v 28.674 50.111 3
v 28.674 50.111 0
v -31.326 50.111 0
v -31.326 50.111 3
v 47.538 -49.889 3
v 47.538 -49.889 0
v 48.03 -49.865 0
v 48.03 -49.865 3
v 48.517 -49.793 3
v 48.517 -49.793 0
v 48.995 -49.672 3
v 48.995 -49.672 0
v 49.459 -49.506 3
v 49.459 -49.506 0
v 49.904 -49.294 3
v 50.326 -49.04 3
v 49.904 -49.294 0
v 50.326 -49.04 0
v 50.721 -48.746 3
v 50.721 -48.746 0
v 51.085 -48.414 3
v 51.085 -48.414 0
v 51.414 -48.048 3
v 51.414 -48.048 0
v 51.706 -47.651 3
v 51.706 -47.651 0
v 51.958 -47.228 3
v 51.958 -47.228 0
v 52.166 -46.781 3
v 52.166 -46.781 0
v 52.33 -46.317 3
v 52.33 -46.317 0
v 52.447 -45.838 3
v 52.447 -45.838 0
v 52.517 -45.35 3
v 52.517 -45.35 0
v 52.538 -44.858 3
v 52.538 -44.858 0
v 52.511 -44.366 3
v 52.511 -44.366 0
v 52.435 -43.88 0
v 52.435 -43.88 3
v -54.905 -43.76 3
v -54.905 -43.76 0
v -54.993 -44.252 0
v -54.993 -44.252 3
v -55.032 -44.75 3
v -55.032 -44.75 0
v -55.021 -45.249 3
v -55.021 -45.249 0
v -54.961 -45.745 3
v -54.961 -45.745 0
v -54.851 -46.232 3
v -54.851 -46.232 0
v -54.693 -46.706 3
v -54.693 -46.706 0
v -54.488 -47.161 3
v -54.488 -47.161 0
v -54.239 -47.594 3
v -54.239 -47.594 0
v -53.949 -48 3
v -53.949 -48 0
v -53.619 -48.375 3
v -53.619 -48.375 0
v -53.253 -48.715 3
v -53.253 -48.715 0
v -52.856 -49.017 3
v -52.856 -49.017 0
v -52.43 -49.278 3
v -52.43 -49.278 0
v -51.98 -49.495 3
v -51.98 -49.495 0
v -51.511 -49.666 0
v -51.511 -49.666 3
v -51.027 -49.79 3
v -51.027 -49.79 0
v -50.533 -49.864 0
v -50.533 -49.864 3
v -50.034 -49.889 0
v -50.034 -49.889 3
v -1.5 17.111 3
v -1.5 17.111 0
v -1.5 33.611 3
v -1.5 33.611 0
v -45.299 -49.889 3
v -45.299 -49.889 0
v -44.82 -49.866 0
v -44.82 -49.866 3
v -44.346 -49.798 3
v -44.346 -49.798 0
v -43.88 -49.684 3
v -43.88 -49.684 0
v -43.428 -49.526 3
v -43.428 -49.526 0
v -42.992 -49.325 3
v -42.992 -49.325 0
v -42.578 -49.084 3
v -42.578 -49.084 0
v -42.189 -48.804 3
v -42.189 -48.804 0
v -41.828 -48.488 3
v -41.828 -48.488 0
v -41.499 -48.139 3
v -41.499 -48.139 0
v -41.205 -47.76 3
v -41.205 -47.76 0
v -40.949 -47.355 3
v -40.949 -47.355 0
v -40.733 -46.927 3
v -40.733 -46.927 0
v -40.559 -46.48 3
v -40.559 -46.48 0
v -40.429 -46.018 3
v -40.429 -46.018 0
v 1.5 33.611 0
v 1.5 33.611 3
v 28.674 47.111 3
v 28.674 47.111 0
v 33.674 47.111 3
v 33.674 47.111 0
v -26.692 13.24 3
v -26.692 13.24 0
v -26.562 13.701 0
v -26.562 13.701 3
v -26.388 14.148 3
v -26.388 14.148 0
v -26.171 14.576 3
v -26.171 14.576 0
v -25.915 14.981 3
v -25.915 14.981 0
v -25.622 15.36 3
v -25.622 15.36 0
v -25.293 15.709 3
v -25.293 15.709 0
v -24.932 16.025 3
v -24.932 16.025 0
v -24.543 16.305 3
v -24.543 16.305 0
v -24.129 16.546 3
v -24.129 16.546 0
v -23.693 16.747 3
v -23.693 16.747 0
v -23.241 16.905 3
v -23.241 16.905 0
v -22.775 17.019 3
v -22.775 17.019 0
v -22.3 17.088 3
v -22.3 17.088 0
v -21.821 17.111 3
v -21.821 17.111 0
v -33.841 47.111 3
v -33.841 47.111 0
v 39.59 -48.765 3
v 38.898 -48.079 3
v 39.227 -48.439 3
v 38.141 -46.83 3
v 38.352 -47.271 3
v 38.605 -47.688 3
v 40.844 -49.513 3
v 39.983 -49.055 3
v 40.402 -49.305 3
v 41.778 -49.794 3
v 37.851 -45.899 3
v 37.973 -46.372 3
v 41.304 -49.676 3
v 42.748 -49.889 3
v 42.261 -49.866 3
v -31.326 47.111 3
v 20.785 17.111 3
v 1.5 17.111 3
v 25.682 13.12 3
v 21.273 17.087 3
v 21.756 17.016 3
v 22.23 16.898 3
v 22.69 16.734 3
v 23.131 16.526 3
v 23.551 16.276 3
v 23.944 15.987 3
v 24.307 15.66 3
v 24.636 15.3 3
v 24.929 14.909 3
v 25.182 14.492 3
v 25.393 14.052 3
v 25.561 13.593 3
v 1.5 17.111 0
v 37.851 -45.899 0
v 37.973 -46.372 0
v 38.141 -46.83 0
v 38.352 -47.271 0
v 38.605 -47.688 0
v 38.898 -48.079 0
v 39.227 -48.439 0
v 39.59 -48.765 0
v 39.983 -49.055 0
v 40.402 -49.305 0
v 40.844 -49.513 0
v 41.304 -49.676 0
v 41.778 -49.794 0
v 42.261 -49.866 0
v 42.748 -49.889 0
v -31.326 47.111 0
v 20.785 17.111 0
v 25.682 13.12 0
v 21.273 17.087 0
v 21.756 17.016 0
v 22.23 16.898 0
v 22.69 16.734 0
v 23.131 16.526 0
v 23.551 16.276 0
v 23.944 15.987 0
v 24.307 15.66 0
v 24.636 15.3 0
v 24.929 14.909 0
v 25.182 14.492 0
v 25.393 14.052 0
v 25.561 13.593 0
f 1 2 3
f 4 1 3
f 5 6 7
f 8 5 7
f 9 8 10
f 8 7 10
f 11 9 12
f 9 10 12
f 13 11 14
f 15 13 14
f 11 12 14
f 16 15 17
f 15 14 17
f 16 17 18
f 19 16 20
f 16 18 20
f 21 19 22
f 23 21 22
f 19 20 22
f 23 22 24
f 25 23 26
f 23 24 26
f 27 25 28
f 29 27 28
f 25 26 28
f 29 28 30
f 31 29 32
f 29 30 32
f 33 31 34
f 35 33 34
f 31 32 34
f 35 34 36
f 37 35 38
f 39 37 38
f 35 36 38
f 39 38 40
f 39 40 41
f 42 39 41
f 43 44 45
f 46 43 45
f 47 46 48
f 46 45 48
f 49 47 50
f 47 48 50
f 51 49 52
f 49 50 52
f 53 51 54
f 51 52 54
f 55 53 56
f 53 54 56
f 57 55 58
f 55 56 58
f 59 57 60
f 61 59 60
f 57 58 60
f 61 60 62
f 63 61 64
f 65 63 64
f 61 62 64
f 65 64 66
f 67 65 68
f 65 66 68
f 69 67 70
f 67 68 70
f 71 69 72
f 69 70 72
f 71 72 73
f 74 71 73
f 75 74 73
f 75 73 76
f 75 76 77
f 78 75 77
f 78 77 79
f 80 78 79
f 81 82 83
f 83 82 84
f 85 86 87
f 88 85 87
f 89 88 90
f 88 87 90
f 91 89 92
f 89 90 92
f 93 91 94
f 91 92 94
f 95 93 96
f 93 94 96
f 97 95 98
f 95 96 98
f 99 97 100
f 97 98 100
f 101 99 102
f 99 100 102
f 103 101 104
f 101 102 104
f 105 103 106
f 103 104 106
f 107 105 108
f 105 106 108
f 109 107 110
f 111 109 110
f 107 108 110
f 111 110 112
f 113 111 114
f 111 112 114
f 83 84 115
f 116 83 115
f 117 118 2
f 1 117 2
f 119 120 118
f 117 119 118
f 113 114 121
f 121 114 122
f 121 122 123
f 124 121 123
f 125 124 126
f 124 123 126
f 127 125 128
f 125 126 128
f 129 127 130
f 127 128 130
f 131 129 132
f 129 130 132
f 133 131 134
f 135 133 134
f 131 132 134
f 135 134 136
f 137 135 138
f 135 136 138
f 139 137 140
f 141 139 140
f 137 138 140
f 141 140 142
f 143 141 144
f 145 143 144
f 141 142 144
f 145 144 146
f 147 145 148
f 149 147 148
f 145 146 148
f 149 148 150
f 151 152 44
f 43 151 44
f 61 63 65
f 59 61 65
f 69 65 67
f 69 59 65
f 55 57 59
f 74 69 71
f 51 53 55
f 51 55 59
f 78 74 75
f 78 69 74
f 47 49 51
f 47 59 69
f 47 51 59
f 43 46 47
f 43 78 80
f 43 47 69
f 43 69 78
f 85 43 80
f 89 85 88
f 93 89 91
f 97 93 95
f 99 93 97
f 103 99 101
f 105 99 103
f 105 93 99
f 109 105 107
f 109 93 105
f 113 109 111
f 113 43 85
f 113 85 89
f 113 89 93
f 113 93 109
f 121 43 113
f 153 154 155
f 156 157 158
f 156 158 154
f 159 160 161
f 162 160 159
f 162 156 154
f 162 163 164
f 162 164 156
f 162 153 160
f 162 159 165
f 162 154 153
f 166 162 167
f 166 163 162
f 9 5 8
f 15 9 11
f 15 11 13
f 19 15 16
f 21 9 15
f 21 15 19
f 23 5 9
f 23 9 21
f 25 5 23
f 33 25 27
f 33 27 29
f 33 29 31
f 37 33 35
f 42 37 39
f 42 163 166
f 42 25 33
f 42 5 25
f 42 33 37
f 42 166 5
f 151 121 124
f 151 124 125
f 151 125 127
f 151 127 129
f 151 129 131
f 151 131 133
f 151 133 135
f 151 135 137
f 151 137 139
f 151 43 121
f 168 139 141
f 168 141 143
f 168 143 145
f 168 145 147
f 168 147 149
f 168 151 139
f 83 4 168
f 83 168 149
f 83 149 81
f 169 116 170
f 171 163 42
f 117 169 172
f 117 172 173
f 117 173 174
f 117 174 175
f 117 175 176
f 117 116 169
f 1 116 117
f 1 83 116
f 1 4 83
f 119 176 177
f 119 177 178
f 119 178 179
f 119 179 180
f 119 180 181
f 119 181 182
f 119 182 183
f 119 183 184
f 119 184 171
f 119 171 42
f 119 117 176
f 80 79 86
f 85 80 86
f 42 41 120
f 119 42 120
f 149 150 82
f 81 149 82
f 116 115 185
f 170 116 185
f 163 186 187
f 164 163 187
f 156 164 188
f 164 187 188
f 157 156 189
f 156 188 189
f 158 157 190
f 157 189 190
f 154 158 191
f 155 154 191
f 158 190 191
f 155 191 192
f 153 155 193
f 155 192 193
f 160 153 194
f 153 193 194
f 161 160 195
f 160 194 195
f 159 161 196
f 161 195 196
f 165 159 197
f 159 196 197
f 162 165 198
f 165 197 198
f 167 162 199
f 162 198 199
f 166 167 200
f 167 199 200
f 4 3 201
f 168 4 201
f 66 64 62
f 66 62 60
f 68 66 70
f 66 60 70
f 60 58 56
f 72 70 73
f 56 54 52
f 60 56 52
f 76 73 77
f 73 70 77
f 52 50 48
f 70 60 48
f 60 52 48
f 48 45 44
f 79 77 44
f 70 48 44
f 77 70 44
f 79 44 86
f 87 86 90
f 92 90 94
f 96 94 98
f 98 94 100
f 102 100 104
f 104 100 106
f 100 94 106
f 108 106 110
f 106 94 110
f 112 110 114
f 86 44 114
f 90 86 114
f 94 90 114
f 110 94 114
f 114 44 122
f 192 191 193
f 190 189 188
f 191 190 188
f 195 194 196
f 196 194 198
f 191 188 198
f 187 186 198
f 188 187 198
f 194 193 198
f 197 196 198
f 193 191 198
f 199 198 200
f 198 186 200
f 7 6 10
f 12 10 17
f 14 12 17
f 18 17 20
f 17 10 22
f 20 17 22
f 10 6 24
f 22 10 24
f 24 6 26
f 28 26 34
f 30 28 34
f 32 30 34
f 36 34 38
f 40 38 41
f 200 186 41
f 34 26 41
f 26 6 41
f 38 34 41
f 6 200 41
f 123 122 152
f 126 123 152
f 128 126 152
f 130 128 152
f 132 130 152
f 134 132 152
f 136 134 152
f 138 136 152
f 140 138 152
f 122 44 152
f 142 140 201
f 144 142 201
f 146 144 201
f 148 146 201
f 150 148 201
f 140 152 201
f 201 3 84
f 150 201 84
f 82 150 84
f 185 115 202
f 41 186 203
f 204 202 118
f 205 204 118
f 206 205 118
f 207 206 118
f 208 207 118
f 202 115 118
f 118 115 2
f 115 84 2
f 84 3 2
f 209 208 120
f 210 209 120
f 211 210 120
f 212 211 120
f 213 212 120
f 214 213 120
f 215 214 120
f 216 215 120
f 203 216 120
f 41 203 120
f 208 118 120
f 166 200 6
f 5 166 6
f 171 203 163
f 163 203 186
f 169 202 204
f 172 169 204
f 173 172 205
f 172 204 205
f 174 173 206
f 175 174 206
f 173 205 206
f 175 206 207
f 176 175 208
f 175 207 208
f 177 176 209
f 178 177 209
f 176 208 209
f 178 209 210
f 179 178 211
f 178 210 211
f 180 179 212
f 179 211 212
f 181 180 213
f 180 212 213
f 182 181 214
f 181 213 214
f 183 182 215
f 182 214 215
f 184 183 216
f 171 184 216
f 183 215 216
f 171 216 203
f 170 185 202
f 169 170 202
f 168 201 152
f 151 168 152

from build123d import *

# Parameters (mm, degrees)
F1_DEPTH = 3


with BuildPart() as f1:
    # F0 (on Top) → F1 (new body)
    with BuildSketch(Plane.XY):
        with BuildLine():
            Line((28.674154, 50.110632), (-31.325846, 50.110632))
            Line((-31.325846, 50.110632), (-31.325846, 47.110632))
            Line((-31.325846, 47.110632), (-33.840805, 47.110632))
            Line((-33.840805, 47.110632), (-54.905096, -43.760283))
            ThreePointArc((-54.905096, -43.760283), (-53.948671, -48.000202), (-50.034247, -49.889368))
            Line((-50.034247, -49.889368), (-45.299399, -49.889368))
            ThreePointArc((-45.299399, -49.889368), (-42.188565, -48.803792), (-40.42855, -46.018453))
            Line((-40.42855, -46.018453), (-26.692237, 13.239717))
            ThreePointArc((-26.692237, 13.239717), (-24.932222, 16.025056), (-21.821388, 17.110632))
            Line((-21.821388, 17.110632), (-1.5, 17.110632))
            Line((-1.5, 17.110632), (-1.5, 33.610632))
            Line((-1.5, 33.610632), (1.5, 33.610632))
            Line((1.5, 33.610632), (1.5, 17.110632))
            Line((1.5, 17.110632), (20.785474, 17.110632))
            ThreePointArc((20.785474, 17.110632), (23.94392, 15.986741), (25.682466, 13.120321))
            Line((25.682466, 13.120321), (37.85141, -45.899057))
            ThreePointArc((37.85141, -45.899057), (39.589956, -48.765477), (42.748401, -49.889368))
            Line((42.748401, -49.889368), (47.538051, -49.889368))
            ThreePointArc((47.538051, -49.889368), (51.414161, -48.047813), (52.435043, -43.879679))
            Line((52.435043, -43.879679), (33.674154, 47.110632))
            Line((33.674154, 47.110632), (28.674154, 47.110632))
            Line((28.674154, 47.110632), (28.674154, 50.110632))
        make_face()
    extrude(amount=F1_DEPTH)


solid = f1.part
